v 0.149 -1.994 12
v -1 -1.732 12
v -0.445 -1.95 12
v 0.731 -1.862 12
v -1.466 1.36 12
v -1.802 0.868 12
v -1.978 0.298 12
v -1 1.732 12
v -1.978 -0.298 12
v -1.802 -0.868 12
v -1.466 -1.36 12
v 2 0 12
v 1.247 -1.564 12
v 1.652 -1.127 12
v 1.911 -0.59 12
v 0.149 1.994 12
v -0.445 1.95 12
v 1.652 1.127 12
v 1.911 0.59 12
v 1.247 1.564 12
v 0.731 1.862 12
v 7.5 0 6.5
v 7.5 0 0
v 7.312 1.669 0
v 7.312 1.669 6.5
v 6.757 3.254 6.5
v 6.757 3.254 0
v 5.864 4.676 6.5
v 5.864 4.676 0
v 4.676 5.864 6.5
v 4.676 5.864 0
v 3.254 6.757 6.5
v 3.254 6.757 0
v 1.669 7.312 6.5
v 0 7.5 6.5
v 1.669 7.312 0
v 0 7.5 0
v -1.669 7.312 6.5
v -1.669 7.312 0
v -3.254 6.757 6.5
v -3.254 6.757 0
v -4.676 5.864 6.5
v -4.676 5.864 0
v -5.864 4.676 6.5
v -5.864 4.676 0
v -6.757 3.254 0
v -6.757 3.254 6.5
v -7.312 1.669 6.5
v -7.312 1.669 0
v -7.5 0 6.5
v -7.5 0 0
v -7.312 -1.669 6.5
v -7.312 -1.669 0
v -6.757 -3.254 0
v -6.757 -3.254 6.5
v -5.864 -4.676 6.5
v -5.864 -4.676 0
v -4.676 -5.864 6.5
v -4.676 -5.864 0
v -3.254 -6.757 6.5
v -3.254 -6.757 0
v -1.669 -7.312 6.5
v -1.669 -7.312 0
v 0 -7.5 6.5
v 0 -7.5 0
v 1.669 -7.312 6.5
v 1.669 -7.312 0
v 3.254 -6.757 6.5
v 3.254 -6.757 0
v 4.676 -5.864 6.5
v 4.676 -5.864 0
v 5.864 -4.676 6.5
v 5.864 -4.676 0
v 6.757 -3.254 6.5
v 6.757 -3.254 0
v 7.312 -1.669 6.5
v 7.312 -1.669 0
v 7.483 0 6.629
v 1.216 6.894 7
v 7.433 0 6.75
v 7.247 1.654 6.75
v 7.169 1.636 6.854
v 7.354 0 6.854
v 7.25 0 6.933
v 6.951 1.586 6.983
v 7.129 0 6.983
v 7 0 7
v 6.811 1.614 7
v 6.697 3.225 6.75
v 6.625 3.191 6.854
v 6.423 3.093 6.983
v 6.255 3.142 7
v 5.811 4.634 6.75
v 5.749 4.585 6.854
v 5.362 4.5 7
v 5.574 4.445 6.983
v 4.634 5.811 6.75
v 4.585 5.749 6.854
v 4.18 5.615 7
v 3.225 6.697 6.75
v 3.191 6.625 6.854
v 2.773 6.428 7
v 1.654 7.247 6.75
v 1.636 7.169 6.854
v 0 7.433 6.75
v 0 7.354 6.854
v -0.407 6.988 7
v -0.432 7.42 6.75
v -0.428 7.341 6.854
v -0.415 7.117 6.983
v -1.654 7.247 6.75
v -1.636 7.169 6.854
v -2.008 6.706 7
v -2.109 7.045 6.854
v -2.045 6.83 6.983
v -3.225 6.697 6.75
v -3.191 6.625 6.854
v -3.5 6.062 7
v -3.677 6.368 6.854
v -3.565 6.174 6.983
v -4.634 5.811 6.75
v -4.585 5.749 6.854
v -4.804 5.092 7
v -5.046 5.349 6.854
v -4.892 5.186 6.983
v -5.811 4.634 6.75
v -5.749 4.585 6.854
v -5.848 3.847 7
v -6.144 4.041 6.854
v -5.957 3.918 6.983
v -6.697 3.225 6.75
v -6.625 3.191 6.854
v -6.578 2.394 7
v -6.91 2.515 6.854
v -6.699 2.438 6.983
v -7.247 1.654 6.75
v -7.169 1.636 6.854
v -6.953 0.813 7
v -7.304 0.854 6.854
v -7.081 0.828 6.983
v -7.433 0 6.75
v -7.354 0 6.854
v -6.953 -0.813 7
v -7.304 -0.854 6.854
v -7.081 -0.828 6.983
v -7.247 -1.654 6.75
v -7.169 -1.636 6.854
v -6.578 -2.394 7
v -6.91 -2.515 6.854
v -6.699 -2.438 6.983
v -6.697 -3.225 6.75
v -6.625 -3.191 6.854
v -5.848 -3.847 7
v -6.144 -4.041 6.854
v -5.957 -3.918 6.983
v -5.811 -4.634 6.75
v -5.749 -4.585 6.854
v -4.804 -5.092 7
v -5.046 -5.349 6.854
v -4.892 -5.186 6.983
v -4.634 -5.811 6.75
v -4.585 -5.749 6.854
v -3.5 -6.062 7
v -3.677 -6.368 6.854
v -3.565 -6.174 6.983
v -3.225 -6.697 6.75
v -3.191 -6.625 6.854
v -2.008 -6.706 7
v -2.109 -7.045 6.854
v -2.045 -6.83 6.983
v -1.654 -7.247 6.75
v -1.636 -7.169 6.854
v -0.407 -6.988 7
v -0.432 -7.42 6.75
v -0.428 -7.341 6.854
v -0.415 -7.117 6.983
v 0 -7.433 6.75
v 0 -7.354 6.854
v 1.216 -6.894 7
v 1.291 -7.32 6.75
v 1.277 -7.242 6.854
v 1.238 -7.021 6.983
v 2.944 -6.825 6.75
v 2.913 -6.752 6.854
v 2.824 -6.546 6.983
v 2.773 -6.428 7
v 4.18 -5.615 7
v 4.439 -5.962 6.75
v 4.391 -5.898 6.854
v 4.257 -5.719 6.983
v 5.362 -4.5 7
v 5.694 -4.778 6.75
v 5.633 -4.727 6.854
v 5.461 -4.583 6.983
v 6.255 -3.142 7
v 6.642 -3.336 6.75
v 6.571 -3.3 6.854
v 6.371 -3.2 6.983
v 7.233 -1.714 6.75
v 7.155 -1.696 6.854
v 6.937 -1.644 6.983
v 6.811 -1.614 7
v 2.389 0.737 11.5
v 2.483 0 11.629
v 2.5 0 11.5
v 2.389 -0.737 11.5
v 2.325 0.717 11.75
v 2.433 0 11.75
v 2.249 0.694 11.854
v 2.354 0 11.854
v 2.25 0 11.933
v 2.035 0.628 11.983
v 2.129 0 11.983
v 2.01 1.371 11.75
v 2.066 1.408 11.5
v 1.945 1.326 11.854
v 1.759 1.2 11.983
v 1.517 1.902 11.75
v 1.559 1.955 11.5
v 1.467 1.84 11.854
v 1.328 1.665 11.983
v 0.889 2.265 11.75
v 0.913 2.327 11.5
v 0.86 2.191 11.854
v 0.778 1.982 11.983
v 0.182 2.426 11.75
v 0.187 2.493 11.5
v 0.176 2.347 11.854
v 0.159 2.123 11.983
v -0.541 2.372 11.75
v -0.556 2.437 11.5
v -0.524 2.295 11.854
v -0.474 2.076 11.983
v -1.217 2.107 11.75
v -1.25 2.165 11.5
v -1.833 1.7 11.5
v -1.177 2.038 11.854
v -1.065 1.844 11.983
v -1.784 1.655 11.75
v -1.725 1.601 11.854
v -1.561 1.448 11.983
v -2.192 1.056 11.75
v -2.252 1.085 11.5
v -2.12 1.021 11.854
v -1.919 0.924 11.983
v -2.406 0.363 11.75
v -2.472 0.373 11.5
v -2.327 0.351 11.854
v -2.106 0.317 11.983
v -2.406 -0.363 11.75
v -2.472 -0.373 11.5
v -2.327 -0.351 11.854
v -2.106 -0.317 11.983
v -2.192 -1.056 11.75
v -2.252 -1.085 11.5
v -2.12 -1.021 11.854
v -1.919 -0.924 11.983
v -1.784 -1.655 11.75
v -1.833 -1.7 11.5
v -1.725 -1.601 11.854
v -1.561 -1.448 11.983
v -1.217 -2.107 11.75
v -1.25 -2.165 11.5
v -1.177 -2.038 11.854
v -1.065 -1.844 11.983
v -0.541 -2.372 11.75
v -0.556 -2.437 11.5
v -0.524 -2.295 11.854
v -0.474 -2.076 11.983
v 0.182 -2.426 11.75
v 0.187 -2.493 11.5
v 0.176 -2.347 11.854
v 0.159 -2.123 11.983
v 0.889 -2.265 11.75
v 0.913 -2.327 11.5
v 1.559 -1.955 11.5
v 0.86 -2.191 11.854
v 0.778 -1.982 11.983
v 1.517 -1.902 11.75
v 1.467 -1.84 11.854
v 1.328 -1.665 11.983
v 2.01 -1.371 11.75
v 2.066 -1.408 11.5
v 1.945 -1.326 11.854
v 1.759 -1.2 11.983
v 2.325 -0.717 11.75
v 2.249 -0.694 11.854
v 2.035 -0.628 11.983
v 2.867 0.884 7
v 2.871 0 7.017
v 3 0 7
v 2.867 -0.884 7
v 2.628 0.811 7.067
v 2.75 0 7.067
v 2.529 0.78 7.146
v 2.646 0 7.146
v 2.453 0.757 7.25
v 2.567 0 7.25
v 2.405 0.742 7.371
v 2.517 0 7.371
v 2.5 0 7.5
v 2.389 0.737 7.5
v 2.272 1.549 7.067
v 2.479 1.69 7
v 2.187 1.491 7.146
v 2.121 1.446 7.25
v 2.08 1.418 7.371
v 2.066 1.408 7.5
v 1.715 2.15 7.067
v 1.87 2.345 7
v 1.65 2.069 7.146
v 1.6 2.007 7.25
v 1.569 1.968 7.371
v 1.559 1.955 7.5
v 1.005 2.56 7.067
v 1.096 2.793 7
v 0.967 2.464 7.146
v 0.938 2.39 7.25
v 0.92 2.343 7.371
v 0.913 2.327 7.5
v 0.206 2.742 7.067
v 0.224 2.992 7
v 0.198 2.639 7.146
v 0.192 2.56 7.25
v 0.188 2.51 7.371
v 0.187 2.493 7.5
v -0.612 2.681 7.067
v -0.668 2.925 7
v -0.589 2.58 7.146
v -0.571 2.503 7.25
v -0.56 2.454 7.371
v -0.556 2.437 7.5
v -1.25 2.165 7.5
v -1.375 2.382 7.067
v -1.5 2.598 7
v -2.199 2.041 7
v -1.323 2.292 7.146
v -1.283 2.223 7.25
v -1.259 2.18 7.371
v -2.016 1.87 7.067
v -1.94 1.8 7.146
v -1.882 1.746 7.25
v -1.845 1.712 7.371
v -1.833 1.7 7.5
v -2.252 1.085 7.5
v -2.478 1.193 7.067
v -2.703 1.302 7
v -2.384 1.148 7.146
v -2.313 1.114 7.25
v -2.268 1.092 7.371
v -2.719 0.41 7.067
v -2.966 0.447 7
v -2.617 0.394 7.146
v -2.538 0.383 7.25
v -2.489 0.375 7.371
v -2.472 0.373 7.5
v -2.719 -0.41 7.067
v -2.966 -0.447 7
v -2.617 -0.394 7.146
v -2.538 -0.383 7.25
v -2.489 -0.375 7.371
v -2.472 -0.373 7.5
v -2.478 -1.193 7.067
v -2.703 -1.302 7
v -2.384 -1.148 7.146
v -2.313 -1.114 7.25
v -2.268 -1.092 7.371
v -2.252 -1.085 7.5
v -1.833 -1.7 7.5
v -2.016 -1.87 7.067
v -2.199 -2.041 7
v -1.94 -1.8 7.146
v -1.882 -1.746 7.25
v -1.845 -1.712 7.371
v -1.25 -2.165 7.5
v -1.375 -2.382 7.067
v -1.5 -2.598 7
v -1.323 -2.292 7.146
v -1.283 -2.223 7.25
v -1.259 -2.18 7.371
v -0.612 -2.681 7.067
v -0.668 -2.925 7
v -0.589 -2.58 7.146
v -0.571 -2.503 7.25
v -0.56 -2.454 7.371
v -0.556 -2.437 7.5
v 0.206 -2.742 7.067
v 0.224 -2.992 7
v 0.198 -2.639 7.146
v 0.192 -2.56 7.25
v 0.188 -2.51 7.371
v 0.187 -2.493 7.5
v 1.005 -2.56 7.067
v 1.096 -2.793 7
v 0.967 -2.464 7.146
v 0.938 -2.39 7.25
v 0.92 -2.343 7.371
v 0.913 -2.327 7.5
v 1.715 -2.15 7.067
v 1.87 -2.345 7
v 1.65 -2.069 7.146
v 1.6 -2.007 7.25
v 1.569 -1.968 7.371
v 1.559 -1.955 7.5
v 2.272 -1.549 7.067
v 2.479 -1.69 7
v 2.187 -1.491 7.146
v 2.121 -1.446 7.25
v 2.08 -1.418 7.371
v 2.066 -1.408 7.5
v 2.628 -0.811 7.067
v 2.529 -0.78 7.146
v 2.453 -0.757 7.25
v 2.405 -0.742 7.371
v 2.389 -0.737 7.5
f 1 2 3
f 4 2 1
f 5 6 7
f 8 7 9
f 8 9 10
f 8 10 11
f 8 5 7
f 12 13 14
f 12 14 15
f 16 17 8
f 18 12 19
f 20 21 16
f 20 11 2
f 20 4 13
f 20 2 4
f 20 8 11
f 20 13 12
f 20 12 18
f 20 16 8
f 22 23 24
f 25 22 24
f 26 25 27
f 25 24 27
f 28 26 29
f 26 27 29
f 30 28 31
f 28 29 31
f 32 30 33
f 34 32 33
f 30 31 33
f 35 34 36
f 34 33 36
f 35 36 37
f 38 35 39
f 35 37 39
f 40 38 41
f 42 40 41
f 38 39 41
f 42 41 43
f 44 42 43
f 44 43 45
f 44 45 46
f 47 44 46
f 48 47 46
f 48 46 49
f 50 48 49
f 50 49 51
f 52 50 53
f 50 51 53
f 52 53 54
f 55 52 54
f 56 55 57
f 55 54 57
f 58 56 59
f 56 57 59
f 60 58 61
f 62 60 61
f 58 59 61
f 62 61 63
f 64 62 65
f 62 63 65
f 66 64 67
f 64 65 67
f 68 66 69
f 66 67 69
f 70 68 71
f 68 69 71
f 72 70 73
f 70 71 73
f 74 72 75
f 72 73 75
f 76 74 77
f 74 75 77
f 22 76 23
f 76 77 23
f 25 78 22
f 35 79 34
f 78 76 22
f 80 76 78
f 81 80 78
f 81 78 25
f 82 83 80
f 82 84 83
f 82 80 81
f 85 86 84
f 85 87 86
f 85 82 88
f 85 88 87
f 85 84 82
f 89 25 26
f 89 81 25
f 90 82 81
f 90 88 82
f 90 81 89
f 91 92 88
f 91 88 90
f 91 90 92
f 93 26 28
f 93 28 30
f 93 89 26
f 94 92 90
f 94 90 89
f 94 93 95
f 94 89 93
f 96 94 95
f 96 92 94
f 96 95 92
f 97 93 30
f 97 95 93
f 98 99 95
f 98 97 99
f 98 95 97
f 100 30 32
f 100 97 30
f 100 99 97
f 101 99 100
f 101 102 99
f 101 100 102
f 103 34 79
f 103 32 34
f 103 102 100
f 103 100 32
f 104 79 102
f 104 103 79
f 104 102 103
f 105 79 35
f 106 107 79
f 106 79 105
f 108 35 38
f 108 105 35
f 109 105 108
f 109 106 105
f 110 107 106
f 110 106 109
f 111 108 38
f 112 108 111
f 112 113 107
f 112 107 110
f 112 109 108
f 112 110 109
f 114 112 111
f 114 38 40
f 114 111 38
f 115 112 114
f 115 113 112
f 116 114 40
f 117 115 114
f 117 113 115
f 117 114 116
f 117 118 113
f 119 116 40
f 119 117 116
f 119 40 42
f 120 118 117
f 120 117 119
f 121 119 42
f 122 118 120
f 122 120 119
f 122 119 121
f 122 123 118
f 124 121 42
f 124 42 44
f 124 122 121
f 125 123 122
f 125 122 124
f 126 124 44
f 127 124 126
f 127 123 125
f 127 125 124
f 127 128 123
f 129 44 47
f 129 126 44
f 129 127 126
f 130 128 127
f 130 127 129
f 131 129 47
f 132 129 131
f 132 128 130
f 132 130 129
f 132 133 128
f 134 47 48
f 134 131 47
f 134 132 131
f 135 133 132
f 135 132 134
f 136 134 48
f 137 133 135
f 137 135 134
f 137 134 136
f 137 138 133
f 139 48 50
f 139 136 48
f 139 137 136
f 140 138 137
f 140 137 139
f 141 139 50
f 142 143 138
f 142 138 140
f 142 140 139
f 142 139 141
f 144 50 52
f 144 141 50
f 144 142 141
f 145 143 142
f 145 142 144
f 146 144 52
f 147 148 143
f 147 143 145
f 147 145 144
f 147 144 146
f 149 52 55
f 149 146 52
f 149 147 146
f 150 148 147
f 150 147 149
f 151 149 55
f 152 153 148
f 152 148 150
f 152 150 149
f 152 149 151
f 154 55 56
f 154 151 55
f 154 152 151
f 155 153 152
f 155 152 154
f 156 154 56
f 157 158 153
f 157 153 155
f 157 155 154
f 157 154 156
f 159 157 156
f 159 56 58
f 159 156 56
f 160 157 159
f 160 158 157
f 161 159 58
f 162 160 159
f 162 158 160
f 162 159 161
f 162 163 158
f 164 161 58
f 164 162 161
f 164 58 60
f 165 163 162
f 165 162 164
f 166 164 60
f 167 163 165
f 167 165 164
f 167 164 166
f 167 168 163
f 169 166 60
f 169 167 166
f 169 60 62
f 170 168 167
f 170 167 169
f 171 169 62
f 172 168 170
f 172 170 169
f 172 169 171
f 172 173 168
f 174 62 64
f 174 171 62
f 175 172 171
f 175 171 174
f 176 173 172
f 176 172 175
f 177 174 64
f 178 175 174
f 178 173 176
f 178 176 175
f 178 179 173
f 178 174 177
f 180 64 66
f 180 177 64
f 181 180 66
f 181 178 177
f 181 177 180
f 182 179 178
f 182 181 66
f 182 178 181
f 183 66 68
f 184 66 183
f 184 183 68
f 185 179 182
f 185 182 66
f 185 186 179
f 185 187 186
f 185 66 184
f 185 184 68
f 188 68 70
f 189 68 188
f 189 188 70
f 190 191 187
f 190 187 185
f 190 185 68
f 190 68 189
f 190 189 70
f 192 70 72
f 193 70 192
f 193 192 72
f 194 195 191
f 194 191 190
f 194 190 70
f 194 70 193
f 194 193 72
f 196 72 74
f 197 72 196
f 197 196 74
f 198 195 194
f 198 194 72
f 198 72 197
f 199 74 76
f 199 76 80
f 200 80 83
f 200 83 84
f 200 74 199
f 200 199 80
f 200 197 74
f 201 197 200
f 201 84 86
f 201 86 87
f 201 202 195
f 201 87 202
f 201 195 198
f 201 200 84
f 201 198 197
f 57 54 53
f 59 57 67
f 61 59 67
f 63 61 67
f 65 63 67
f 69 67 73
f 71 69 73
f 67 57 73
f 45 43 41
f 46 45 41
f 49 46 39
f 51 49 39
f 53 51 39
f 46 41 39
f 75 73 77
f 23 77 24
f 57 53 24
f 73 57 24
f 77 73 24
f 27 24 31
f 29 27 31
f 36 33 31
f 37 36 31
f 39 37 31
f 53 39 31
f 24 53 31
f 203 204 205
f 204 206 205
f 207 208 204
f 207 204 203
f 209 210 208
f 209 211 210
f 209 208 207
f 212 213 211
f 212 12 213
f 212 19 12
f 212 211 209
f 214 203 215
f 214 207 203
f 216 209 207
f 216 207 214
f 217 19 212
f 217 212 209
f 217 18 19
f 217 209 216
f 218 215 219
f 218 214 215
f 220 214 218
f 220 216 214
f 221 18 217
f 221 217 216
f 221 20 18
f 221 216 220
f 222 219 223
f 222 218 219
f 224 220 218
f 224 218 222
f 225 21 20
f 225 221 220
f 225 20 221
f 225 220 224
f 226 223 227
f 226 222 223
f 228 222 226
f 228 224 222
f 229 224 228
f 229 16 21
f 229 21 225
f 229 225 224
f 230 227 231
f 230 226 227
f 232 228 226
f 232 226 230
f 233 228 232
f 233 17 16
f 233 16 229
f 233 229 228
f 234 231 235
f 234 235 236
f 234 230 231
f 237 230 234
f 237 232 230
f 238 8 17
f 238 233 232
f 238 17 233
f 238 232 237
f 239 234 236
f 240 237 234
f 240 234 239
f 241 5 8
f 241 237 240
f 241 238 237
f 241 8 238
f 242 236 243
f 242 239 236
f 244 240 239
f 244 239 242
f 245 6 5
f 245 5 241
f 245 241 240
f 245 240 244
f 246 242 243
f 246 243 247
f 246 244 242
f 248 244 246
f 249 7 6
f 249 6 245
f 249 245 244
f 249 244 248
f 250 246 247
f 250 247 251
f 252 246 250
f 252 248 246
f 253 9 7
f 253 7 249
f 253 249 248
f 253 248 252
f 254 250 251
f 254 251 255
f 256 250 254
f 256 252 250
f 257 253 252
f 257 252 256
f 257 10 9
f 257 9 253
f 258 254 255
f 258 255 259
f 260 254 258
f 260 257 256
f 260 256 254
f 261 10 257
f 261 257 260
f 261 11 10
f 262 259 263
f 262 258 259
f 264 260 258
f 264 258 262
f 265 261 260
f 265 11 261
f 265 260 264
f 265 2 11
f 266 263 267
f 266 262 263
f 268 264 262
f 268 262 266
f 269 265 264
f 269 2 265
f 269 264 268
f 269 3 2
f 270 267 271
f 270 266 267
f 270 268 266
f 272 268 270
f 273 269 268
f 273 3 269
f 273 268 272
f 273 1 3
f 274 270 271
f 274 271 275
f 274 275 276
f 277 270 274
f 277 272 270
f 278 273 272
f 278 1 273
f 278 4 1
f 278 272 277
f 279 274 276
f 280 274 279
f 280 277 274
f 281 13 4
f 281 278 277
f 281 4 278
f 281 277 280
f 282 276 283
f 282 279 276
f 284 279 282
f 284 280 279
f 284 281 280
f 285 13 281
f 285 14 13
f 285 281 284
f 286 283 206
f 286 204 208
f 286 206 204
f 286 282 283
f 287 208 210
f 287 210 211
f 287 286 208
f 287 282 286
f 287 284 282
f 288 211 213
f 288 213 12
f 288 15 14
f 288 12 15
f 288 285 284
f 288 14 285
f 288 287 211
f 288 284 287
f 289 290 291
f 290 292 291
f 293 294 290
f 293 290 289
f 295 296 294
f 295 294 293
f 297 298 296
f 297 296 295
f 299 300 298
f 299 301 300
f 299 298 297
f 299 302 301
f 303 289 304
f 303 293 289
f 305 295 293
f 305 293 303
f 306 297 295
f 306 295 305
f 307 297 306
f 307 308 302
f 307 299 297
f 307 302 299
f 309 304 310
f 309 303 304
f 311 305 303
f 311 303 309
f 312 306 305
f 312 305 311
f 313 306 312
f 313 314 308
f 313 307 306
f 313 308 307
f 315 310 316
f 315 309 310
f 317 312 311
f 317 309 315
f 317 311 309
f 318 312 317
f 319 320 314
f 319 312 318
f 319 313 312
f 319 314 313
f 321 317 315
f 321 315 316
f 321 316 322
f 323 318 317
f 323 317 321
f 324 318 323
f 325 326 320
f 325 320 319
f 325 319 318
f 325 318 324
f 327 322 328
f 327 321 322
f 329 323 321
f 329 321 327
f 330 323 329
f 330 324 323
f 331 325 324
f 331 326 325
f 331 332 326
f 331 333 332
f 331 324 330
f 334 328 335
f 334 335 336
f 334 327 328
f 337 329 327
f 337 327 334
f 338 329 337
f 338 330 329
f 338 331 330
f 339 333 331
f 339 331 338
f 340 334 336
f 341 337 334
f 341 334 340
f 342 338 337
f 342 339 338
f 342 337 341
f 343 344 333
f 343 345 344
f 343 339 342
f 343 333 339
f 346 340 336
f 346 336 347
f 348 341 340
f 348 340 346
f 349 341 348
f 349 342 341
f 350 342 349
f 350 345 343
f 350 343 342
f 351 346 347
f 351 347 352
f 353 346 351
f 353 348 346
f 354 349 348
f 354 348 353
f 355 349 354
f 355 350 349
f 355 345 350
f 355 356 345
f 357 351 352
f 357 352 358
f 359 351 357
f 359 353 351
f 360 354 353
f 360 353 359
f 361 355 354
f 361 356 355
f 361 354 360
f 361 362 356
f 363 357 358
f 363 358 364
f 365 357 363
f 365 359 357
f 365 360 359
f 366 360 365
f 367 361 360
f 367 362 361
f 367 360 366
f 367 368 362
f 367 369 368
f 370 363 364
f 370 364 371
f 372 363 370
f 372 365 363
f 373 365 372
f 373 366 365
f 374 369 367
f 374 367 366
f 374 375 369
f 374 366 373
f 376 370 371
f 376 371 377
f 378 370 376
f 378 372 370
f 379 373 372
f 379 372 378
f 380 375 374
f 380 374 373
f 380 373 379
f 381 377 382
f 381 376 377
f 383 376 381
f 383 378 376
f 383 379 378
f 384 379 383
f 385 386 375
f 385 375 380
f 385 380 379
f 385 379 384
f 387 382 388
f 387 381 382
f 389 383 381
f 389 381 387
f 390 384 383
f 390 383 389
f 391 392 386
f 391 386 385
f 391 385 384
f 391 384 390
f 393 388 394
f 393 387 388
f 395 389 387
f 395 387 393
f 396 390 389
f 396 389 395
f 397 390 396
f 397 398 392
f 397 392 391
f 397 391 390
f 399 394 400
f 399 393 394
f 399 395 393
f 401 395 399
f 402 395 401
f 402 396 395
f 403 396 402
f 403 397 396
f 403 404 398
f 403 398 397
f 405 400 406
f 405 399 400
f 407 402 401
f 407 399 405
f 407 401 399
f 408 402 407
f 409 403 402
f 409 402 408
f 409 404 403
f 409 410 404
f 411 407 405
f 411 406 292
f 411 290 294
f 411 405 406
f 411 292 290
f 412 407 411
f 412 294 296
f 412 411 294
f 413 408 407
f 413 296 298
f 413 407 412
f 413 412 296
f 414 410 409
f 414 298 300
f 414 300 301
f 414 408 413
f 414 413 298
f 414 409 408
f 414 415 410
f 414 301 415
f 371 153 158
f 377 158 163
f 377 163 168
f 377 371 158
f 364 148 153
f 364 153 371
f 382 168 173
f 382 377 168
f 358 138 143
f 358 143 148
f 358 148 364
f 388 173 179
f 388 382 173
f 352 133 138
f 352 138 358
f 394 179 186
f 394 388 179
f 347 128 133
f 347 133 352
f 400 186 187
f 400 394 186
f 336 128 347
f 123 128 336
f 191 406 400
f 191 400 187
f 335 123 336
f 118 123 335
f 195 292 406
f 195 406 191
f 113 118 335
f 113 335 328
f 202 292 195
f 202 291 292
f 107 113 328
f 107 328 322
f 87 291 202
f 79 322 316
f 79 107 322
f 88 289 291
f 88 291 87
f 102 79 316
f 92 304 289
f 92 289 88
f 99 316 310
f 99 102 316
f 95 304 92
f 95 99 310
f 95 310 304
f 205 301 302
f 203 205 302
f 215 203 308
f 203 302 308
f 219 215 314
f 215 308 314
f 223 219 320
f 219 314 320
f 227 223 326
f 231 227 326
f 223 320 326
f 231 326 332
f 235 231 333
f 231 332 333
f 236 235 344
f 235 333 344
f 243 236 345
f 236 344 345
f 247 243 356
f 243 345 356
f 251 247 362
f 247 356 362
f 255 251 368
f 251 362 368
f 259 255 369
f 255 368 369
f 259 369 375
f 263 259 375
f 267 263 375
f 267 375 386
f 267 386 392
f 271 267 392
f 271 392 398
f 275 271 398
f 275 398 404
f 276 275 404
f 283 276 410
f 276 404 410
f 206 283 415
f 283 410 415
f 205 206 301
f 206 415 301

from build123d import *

# Parameters (mm, degrees)
ESQUISSE1_R        = 7.5
BOSS_EXTRU_1_DEPTH = 7
ESQUISSE2_R        = 2.5
BOSS_EXTRU_2_DEPTH = 5
CONG_1_R           = 0.5


with BuildPart() as part:
    # Esquisse1 → Boss.-Extru.1 (new body)
    with BuildSketch(Plane.XY):
        Circle(ESQUISSE1_R)
    extrude(amount=BOSS_EXTRU_1_DEPTH)

    # Esquisse2 → Boss.-Extru.2 (add)
    with BuildSketch(Plane.XY.offset(7)):
        Circle(ESQUISSE2_R)
    extrude(amount=BOSS_EXTRU_2_DEPTH)

    # Congé1
    cong_1_edges = [part.edges().sort_by_distance(p)[0] for p in [
        (-7.5, 0, 7),
        (-2.5, 0, 7),
        (-2.5, 0, 12),
    ]]
    fillet(cong_1_edges, radius=CONG_1_R)


solid = part.part
